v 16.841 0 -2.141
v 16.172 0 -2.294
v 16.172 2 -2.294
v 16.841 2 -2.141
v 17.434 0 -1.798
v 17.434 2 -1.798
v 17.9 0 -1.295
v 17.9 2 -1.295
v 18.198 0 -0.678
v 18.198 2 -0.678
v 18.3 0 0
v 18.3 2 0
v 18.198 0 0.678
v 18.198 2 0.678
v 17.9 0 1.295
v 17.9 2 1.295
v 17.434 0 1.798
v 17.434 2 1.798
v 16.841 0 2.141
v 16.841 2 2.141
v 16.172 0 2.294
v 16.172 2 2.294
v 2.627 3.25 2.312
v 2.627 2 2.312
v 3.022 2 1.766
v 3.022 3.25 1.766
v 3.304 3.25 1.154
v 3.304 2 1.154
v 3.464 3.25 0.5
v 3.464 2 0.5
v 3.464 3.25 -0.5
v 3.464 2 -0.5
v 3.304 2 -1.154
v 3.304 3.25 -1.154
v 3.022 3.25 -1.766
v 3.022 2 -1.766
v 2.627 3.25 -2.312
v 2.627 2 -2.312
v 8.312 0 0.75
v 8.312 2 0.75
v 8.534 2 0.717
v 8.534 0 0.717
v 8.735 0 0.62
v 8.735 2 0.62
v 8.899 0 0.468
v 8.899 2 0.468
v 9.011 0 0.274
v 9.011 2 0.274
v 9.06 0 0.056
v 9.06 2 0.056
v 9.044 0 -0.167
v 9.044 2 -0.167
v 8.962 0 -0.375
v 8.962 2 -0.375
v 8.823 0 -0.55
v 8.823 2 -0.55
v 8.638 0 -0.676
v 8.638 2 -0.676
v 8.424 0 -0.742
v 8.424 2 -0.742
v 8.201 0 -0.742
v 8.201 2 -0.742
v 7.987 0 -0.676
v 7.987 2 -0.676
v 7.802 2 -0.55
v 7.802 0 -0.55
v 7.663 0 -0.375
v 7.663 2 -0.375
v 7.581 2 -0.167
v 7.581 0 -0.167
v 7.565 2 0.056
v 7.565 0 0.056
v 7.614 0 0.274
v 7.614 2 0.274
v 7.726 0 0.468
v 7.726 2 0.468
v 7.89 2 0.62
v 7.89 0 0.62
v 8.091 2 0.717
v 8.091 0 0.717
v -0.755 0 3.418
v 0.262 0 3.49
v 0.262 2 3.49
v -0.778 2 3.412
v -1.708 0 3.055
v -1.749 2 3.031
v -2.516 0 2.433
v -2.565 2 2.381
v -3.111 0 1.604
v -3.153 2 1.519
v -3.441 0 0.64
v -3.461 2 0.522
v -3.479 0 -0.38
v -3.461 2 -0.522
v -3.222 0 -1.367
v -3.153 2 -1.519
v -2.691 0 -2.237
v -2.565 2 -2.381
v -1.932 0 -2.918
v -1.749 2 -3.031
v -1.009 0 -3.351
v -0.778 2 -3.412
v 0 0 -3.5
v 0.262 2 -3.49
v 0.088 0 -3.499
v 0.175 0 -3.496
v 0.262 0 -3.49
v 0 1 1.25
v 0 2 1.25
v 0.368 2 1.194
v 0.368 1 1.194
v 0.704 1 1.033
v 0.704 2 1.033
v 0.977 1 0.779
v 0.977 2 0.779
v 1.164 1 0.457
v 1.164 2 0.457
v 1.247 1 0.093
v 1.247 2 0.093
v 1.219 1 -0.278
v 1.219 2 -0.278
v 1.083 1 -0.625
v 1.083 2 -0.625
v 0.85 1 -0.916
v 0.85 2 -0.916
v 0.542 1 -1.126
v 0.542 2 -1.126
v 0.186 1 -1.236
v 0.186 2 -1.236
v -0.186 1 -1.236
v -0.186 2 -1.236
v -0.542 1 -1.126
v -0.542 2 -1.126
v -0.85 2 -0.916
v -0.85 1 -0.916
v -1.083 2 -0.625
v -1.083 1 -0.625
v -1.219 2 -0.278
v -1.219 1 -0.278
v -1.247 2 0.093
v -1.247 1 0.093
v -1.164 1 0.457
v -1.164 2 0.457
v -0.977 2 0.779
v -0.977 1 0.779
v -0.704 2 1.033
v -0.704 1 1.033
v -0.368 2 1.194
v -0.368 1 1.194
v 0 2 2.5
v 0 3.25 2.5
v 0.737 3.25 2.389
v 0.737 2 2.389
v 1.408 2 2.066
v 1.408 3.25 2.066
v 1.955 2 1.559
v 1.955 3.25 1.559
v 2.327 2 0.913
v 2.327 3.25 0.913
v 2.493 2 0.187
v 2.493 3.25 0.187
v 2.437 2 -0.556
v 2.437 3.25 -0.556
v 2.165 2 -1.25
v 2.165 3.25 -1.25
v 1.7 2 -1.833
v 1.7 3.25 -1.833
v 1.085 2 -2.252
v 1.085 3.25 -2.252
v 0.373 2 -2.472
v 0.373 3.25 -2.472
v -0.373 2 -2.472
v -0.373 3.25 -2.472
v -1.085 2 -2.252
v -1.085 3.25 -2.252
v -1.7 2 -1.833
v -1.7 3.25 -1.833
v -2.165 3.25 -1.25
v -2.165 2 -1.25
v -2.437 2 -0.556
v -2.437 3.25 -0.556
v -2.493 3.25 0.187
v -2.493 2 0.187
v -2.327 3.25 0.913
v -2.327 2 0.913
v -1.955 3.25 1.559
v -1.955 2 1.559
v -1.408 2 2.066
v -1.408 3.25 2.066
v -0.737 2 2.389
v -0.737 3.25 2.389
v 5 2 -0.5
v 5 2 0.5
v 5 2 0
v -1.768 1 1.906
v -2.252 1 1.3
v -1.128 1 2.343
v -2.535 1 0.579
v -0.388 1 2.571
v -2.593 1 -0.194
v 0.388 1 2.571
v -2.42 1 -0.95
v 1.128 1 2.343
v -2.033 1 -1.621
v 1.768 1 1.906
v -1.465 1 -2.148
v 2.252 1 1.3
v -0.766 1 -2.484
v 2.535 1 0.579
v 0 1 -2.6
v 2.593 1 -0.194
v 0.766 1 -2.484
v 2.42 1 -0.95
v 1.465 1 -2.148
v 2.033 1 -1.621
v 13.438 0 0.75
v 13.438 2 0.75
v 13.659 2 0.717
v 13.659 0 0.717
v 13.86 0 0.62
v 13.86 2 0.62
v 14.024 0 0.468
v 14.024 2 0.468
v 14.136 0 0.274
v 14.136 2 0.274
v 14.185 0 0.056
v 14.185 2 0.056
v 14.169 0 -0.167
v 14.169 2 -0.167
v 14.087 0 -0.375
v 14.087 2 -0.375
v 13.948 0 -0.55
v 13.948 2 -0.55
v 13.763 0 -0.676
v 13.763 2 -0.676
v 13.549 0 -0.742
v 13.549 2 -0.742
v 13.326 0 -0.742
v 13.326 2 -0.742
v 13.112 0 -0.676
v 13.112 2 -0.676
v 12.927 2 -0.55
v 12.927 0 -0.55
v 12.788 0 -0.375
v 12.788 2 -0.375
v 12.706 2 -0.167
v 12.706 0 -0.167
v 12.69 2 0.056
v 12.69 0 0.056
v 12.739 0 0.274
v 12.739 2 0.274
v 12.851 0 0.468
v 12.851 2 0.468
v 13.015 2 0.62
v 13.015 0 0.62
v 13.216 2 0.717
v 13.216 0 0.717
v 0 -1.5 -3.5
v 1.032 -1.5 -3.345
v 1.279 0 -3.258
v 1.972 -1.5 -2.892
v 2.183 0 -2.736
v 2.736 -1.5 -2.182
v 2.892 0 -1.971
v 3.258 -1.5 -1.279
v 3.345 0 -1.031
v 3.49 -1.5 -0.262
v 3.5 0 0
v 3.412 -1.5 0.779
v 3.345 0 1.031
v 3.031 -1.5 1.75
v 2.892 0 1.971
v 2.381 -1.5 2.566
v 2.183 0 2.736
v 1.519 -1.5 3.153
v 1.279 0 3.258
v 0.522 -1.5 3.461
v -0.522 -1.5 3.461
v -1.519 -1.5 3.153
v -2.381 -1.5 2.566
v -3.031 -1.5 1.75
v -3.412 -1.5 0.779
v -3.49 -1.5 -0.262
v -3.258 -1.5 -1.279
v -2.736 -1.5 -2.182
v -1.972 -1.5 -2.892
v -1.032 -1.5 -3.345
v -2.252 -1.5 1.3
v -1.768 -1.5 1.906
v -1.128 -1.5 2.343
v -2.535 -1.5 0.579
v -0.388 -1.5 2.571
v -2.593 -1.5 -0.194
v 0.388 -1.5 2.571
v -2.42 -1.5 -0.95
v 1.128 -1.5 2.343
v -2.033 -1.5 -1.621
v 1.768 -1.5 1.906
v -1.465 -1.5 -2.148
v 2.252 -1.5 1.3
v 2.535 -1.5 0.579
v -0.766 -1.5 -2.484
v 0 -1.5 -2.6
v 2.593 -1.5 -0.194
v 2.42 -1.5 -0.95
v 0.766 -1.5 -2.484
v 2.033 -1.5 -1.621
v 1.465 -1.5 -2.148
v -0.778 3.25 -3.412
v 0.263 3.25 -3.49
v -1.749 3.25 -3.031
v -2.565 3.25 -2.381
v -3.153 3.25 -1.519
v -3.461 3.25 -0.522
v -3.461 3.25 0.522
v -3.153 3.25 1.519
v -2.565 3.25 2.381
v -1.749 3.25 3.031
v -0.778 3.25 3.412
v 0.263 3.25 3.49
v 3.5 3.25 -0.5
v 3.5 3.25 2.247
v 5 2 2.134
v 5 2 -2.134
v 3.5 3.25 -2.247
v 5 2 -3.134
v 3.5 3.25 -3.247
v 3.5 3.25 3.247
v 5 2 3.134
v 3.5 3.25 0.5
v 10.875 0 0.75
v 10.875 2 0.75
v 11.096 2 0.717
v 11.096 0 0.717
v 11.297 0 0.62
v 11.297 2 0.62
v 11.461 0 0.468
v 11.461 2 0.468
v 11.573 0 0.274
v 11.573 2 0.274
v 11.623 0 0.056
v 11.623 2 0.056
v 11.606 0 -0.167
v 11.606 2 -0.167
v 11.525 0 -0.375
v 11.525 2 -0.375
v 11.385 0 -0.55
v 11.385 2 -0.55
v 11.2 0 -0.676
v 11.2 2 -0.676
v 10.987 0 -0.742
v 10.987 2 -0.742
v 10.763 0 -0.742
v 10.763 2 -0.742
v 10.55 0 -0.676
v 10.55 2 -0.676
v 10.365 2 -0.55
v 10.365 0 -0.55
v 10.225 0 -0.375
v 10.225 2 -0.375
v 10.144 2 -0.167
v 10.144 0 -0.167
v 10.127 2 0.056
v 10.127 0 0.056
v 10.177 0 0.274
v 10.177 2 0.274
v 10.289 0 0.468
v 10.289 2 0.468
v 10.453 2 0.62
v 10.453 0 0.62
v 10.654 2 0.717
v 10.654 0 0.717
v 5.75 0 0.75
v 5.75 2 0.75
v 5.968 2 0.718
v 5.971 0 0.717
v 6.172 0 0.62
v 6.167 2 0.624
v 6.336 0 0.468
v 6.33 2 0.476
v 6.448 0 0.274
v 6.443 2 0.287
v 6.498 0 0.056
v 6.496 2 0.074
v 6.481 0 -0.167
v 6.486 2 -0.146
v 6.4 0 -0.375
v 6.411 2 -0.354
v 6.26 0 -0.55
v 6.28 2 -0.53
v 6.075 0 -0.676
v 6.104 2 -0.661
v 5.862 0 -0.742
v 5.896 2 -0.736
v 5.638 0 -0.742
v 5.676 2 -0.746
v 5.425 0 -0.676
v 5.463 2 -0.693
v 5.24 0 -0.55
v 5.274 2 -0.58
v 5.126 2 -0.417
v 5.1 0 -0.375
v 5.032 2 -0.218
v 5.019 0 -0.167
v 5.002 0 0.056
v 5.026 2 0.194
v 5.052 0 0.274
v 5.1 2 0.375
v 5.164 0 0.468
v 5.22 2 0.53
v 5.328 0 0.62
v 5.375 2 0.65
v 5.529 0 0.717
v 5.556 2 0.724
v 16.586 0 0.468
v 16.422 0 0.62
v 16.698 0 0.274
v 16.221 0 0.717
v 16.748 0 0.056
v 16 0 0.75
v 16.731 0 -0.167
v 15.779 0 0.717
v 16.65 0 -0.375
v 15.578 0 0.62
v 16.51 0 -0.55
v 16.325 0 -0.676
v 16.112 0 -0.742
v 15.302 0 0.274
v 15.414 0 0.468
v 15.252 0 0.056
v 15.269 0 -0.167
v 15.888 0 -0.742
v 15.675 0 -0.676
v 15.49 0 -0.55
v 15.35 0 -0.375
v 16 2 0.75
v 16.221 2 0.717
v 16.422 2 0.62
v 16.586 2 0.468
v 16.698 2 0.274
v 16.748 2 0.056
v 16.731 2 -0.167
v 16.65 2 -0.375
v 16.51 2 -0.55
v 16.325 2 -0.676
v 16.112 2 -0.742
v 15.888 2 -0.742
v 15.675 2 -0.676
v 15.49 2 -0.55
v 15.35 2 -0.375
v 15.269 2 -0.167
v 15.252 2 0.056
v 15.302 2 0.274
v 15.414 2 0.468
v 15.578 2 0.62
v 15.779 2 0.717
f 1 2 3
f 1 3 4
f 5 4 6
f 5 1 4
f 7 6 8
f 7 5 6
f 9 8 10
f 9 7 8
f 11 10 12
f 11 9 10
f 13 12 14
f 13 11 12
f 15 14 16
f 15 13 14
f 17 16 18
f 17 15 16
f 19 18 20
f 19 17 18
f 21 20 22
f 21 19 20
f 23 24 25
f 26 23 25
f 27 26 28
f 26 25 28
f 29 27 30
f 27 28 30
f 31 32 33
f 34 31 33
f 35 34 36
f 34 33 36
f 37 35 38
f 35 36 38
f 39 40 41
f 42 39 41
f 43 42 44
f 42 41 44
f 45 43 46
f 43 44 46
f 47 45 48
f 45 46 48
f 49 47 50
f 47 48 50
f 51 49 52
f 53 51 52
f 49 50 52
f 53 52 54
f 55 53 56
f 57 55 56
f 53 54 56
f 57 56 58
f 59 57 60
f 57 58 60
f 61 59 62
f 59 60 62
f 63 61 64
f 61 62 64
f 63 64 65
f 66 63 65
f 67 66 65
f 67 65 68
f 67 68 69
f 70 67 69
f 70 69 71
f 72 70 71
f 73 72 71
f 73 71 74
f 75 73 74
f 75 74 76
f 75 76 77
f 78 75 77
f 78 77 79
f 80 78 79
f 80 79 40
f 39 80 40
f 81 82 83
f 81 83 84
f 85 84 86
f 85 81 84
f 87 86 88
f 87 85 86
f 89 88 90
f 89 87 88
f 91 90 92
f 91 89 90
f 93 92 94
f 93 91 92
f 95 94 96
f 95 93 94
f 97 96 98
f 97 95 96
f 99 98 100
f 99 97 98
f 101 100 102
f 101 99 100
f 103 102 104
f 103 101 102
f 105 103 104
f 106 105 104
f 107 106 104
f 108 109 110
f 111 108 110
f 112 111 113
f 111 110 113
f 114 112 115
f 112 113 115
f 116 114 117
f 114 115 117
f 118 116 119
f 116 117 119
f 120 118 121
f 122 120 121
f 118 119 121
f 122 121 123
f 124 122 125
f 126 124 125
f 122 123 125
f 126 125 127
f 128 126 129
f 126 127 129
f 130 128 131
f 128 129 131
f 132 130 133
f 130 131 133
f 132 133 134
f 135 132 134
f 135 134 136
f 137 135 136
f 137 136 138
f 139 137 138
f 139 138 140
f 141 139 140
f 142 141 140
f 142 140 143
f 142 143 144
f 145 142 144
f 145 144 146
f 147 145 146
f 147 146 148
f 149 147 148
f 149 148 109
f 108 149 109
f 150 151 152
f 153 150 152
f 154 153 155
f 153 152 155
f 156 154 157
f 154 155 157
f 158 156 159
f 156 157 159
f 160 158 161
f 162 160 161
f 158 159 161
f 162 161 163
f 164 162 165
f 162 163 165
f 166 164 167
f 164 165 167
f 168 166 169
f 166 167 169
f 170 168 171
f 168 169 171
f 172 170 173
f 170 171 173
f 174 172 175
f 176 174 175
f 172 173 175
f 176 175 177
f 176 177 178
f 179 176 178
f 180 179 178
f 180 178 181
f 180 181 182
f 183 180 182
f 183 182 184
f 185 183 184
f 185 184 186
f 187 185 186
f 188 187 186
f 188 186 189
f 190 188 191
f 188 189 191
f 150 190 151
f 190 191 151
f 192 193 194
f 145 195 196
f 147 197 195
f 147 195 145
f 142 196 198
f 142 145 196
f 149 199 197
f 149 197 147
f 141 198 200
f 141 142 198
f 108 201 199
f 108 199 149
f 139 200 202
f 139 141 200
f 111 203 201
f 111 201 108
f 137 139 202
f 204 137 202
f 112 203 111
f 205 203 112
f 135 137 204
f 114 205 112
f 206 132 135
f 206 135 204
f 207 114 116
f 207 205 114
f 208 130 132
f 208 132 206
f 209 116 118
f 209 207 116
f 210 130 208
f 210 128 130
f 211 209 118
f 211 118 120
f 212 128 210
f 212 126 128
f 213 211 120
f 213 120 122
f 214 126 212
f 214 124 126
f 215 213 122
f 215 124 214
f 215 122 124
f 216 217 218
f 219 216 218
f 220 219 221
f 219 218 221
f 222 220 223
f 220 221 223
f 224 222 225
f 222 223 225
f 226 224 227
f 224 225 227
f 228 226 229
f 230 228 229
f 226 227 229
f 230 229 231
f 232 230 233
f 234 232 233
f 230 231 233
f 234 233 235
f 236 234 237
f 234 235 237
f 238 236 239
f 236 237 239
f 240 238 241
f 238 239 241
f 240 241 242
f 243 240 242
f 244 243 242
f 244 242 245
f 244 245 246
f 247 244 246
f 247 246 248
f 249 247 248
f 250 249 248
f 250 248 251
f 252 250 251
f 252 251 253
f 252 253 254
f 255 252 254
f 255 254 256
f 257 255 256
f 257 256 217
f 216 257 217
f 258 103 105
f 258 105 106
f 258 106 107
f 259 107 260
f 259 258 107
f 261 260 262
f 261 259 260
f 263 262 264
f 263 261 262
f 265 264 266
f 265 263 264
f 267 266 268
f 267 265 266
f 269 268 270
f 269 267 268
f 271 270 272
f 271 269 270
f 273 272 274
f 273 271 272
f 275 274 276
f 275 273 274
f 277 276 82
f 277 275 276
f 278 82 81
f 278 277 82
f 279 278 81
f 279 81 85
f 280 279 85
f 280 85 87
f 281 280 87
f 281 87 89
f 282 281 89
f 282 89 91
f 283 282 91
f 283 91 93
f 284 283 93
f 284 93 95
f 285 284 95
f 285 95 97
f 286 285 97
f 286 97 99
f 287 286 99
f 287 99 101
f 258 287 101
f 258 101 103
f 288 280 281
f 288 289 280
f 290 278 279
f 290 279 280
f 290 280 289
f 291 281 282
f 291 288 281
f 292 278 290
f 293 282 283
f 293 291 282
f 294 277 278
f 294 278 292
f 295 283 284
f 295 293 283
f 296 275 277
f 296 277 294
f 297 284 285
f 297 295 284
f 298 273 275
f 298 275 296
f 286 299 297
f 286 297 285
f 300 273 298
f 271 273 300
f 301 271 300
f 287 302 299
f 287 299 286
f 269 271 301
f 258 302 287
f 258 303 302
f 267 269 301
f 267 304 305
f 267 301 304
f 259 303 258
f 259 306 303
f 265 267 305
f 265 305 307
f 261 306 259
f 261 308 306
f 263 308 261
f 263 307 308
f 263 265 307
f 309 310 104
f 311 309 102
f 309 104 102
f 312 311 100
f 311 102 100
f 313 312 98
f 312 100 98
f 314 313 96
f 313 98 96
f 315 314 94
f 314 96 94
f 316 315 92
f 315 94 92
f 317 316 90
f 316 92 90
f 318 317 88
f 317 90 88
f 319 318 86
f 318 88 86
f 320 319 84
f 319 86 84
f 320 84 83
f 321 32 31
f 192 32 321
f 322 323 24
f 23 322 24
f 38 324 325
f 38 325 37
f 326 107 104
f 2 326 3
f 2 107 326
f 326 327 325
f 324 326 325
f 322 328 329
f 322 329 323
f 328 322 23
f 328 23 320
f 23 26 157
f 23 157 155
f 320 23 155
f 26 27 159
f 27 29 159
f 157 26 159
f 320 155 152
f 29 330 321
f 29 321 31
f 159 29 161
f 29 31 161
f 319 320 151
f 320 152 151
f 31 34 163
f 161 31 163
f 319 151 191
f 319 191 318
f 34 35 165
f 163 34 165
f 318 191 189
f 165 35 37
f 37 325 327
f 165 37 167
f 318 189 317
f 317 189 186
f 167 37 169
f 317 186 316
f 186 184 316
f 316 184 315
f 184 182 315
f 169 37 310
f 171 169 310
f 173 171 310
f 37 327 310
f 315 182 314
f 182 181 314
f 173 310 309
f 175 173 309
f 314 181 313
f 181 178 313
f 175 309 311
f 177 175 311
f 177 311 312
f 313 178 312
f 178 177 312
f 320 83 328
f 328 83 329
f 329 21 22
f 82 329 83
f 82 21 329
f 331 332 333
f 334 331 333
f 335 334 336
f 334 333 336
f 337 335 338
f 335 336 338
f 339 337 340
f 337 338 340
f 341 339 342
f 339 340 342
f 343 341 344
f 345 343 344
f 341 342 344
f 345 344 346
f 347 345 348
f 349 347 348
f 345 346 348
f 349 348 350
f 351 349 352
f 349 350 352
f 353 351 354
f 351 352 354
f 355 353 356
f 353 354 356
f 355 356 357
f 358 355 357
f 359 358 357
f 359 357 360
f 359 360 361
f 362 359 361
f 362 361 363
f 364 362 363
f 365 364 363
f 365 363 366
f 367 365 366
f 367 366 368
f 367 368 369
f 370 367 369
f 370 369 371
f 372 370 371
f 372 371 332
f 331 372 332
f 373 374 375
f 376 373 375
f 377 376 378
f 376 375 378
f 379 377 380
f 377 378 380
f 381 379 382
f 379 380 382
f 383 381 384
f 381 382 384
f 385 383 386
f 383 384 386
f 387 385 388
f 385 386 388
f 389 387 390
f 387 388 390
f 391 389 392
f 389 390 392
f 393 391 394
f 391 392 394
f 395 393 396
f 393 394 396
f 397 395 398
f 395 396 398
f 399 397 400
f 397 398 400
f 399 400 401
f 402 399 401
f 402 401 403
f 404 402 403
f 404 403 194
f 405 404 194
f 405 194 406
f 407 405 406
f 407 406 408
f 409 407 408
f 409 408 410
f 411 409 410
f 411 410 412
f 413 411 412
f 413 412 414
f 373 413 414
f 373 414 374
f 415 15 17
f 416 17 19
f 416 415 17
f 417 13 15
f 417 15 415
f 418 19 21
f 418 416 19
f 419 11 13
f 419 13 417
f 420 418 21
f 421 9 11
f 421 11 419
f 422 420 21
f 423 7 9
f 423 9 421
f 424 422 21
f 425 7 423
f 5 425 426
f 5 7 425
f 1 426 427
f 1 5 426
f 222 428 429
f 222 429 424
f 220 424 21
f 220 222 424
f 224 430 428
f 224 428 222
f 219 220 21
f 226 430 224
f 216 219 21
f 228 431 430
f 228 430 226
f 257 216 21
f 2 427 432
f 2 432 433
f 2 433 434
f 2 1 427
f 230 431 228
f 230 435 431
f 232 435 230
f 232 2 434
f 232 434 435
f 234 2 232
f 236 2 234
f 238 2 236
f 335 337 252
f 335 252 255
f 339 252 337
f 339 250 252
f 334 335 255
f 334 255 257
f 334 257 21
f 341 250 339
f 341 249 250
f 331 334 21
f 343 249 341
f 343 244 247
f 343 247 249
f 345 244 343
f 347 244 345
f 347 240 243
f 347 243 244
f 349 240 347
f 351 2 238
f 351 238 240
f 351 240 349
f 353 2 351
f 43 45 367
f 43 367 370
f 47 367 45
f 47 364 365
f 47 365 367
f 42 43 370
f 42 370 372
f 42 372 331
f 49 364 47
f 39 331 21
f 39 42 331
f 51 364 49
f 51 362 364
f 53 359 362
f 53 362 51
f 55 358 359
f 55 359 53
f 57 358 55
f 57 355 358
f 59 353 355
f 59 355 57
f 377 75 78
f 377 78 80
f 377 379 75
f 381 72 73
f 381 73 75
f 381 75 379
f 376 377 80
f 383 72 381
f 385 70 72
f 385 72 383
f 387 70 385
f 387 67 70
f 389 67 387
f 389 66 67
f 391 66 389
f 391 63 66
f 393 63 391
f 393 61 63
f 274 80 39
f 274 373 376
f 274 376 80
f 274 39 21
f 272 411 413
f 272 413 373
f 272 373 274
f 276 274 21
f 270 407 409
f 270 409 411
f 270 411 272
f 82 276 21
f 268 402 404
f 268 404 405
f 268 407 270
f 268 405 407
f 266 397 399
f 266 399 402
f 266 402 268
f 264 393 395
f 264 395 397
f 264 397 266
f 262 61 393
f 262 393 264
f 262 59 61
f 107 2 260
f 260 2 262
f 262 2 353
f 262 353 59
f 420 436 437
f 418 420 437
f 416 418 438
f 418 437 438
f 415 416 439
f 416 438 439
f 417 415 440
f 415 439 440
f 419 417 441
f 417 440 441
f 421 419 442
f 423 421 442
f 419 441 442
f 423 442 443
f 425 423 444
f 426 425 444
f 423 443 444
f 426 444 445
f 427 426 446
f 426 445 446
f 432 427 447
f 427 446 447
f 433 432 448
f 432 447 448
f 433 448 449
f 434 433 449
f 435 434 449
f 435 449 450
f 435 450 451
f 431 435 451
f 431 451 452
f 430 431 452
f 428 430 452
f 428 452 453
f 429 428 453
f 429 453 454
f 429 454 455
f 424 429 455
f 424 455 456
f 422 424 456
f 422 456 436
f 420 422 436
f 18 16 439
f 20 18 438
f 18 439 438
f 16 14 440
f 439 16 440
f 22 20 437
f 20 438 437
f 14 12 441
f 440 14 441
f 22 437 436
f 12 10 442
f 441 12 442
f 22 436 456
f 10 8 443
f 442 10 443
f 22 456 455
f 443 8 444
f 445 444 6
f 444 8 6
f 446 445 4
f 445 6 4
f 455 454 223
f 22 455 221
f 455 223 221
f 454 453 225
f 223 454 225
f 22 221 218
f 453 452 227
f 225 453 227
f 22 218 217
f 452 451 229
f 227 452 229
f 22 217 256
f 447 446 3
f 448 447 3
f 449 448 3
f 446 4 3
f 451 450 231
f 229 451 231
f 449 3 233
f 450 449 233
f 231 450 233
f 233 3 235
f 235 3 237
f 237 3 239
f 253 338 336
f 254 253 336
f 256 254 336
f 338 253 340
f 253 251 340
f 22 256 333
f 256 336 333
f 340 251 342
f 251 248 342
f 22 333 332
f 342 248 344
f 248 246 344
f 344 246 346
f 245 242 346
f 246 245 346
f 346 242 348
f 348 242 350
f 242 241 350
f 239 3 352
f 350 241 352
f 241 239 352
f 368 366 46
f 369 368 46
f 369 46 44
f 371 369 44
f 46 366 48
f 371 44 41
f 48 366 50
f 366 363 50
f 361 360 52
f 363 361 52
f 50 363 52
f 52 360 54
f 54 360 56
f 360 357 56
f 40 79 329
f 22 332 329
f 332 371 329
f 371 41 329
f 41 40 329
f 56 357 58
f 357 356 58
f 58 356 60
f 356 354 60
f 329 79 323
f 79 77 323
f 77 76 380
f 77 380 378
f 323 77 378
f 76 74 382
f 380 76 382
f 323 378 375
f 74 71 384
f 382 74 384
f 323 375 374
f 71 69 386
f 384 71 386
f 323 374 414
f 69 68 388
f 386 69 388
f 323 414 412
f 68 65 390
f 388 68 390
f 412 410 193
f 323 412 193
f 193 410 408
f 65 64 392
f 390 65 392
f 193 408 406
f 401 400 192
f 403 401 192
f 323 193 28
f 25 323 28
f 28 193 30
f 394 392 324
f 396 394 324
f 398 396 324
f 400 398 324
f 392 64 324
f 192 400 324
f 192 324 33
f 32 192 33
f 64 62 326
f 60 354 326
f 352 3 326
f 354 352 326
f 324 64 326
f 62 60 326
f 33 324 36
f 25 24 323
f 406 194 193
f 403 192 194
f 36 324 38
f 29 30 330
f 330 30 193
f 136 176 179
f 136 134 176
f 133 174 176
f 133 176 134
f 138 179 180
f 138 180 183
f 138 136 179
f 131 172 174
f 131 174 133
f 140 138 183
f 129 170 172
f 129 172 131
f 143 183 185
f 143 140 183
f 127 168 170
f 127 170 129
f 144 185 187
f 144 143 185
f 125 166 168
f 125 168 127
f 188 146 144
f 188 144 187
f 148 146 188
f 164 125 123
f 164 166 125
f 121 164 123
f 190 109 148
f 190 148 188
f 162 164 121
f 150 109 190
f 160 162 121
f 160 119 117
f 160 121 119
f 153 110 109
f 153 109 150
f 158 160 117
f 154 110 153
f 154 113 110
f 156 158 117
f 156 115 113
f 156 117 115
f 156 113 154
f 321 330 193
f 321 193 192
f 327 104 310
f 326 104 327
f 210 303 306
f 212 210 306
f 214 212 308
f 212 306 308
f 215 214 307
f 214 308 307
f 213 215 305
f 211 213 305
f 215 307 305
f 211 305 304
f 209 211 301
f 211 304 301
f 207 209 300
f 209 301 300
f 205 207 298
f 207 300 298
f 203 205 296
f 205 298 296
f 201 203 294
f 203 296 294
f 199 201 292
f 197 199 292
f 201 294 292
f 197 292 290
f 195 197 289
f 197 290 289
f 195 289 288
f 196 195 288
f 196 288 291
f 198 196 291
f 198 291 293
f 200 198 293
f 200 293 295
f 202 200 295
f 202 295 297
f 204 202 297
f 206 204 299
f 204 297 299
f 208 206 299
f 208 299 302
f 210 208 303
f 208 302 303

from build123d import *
from OCP.BRepFilletAPI import BRepFilletAPI_MakeChamfer
from build123d.topology import SkipClean

# Parameters (mm, degrees)
EXTRUDE_1_DEPTH      = 2
EXTRUDE_START        = 1.5
SKETCH_2_R           = 3.5
EXTRUDE_2_DEPTH      = 1.5
SKETCH_3_R           = 2.6
CUT_EXTRUDE_1_DEPTH  = 2.5
SKETCH_4_R           = 3.5
EXTRUDE_3_DEPTH      = 1.25
SKETCH_5_R           = 2.5
CUT_EXTRUDE_2_DEPTH  = 1.25
SKETCH_6_R           = 1.25
CUT_EXTRUDE_3_DEPTH  = 19.957584234
EXTRUDE_4_REACH      = 16.132
EXTRUDE_4_END_RADIUS = 3.5
SKETCH_8_W           = 1
SKETCH_8_H           = 1.25
EXTRUDE_5_DEPTH      = 1.25
CHAMFER_2_SIZE       = 1.25
CHAMFER_2_SIZE_2     = 1.5
SKETCH_10_R          = 0.75
CUT_EXTRUDE_4_DEPTH  = 19.957584234


with BuildPart() as part:
    # 草图1 → 凸台-拉伸1 (new body)
    with BuildSketch(Plane(origin=(0, 0, 0), x_dir=(1, 0, 0), z_dir=(0, 1, 0))):
        with BuildLine():
            Line((0.2625, 3.490142368), (16.1725, 2.293522128))
            ThreePointArc((16.1725, 2.293522128), (18.3, 0), (16.1725, -2.293522128))
            Line((16.1725, -2.293522128), (0.2625, -3.490142368))
            ThreePointArc((0.2625, -3.490142368), (-3.5, 0), (0.2625, 3.490142368))
        make_face()
    extrude(amount=EXTRUDE_1_DEPTH)

    # 草图2 → 凸台-拉伸2 (add)
    with BuildSketch(Plane.XZ.offset(EXTRUDE_START)):
        with Locations(Location((0, 0, 0), (0, 0, 270))):
            Circle(SKETCH_2_R)
    extrude(amount=-EXTRUDE_2_DEPTH)

    # 草图3 → 切除-拉伸1 (cut)
    with BuildSketch(Plane.XZ.offset(1.5)):
        with Locations(Location((0, 0, 0), (0, 0, 270))):
            Circle(SKETCH_3_R)
    extrude(amount=-CUT_EXTRUDE_1_DEPTH, mode=Mode.SUBTRACT)

    # 草图4 → 凸台-拉伸3 (add)
    with SkipClean():  # the faces are left unmerged after this step: merging them gives an invalid solid
        with BuildSketch(Plane(origin=(0, 2, 0), x_dir=(1, 0, 0), z_dir=(0, 1, 0))):
            with Locations(Location((0, 0, 0), (0, 0, 90))):
                Circle(SKETCH_4_R)
        extrude(amount=EXTRUDE_3_DEPTH)

    # 草图5 → 切除-拉伸2 (cut)
    with SkipClean():  # the faces are left unmerged after this step: merging them gives an invalid solid
        with BuildSketch(Plane(origin=(0, 3.25, 0), x_dir=(1, 0, 0), z_dir=(0, 1, 0))):
            with Locations(Location((0, 0, 0), (0, 0, 270))):
                Circle(SKETCH_5_R)
        extrude(amount=-CUT_EXTRUDE_2_DEPTH, mode=Mode.SUBTRACT)

    # 草图6 → 切除-拉伸3 (cut, through all)
    with SkipClean():  # the faces are left unmerged after this step: merging them gives an invalid solid
        with BuildSketch(Plane(origin=(0, 2, 0), x_dir=(1, 0, 0), z_dir=(0, 1, 0))):
            with Locations(Location((0, 0, 0), (0, 0, 270))):
                Circle(SKETCH_6_R)
        extrude(amount=-CUT_EXTRUDE_3_DEPTH, mode=Mode.SUBTRACT)

    # 凸台-拉伸4: up to this cylinder (the profile starts outside it)
    with SkipClean():  # the faces are left unmerged after this step: merging them gives an invalid solid
        extrude_4_end = Plane(origin=(0, 2.625, 0), z_dir=(0, -1, 0)) * Cylinder(EXTRUDE_4_END_RADIUS, 40.264, mode=Mode.PRIVATE)
        # 草图8 → 凸台-拉伸4 (add, up to the surface)
        with BuildSketch(Plane(origin=(5, 0, 0), x_dir=(0, 0, -1), z_dir=(1, 0, 0)), mode=Mode.PRIVATE) as extrude_4_sk1:
            with Locations((0, 2.625)):
                Rectangle(SKETCH_8_W, SKETCH_8_H)
        extrude_4_tool1 = extrude(extrude_4_sk1.sketch, amount=-EXTRUDE_4_REACH, mode=Mode.PRIVATE) - extrude_4_end
        add(extrude_4_tool1.solids().sort_by_distance((5, 2.625, 0))[0])

    # 草图9 → 凸台-拉伸5 (add)
    with SkipClean():  # the faces are left unmerged after this step: merging them gives an invalid solid
        with BuildSketch(Plane(origin=(0, 2, 0), x_dir=(1, 0, 0), z_dir=(0, 1, 0))):
            with BuildLine():
                Line((0.2625, 3.490142368), (5, 3.133826316))
                Line((5, 3.133826316), (5, 2.133826316))
                Line((5, 2.133826316), (2.627432324, 2.312271476))
                ThreePointArc((2.627432324, 2.312271476), (1.56037565, 3.1329264), (0.2625, 3.490142368))
            make_face()
            with BuildLine():
                Line((0.2625, -3.490142368), (5, -3.133826316))
                Line((5, -3.133826316), (5, -2.133826316))
                Line((5, -2.133826316), (2.627432324, -2.312271476))
                ThreePointArc((2.627432324, -2.312271476), (1.56037565, -3.1329264), (0.2625, -3.490142368))
            make_face()
        extrude(amount=EXTRUDE_5_DEPTH)

    # 倒角2
    chamfer_2_edges_1 = [part.edges().sort_by_distance(p)[0] for p in [
        (5, 3.25, 2.633826316),
    ]]
    chamfer_2_side_1 = [part.faces().sort_by_distance(p)[0] for p in [
        (5, 3.225, 2.633826316),
    ]]
    chamfer_2_edges_2 = [part.edges().sort_by_distance(p)[0] for p in [
        (5, 3.25, -2.633826316),
    ]]
    chamfer_2_side_2 = [part.faces().sort_by_distance(p)[0] for p in [
        (5, 3.225, -2.633826316),
    ]]
    chamfer_2_edges_3 = [part.edges().sort_by_distance(p)[0] for p in [
        (5, 3.25, 0),
    ]]
    chamfer_2_side_3 = [part.faces().sort_by_distance(p)[0] for p in [
        (5, 3.225, 0),
    ]]
    chamfer_2 = BRepFilletAPI_MakeChamfer(part.part.solid().wrapped)
    for e in chamfer_2_edges_1:
        chamfer_2.Add(CHAMFER_2_SIZE - 0.0001, CHAMFER_2_SIZE_2 - 0.0001, e.wrapped, chamfer_2_side_1[0].wrapped)
    for e in chamfer_2_edges_2:
        chamfer_2.Add(CHAMFER_2_SIZE - 0.0001, CHAMFER_2_SIZE_2 - 0.0001, e.wrapped, chamfer_2_side_2[0].wrapped)
    for e in chamfer_2_edges_3:
        chamfer_2.Add(CHAMFER_2_SIZE - 0.0001, CHAMFER_2_SIZE_2 - 0.0001, e.wrapped, chamfer_2_side_3[0].wrapped)
    add(Compound.cast(chamfer_2.Shape()), mode=Mode.REPLACE)  # a hair under: the kernel refuses the full size

    # 草图10 → 切除-拉伸4 (cut, through all)
    with BuildSketch(Plane(origin=(0, 2, 0), x_dir=(1, 0, 0), z_dir=(0, 1, 0))):
        with Locations(Location((5.75, 0, 0), (0, 0, 270))):
            Circle(SKETCH_10_R)
        with Locations(Location((8.3125, 0, 0), (0, 0, 270))):
            Circle(SKETCH_10_R)
        with Locations(Location((10.875, 0, 0), (0, 0, 270))):
            Circle(SKETCH_10_R)
        with Locations(Location((13.4375, 0, 0), (0, 0, 270))):
            Circle(SKETCH_10_R)
        with Locations(Location((16, 0, 0), (0, 0, 270))):
            Circle(SKETCH_10_R)
    extrude(amount=-CUT_EXTRUDE_4_DEPTH, mode=Mode.SUBTRACT)


solid = part.part
